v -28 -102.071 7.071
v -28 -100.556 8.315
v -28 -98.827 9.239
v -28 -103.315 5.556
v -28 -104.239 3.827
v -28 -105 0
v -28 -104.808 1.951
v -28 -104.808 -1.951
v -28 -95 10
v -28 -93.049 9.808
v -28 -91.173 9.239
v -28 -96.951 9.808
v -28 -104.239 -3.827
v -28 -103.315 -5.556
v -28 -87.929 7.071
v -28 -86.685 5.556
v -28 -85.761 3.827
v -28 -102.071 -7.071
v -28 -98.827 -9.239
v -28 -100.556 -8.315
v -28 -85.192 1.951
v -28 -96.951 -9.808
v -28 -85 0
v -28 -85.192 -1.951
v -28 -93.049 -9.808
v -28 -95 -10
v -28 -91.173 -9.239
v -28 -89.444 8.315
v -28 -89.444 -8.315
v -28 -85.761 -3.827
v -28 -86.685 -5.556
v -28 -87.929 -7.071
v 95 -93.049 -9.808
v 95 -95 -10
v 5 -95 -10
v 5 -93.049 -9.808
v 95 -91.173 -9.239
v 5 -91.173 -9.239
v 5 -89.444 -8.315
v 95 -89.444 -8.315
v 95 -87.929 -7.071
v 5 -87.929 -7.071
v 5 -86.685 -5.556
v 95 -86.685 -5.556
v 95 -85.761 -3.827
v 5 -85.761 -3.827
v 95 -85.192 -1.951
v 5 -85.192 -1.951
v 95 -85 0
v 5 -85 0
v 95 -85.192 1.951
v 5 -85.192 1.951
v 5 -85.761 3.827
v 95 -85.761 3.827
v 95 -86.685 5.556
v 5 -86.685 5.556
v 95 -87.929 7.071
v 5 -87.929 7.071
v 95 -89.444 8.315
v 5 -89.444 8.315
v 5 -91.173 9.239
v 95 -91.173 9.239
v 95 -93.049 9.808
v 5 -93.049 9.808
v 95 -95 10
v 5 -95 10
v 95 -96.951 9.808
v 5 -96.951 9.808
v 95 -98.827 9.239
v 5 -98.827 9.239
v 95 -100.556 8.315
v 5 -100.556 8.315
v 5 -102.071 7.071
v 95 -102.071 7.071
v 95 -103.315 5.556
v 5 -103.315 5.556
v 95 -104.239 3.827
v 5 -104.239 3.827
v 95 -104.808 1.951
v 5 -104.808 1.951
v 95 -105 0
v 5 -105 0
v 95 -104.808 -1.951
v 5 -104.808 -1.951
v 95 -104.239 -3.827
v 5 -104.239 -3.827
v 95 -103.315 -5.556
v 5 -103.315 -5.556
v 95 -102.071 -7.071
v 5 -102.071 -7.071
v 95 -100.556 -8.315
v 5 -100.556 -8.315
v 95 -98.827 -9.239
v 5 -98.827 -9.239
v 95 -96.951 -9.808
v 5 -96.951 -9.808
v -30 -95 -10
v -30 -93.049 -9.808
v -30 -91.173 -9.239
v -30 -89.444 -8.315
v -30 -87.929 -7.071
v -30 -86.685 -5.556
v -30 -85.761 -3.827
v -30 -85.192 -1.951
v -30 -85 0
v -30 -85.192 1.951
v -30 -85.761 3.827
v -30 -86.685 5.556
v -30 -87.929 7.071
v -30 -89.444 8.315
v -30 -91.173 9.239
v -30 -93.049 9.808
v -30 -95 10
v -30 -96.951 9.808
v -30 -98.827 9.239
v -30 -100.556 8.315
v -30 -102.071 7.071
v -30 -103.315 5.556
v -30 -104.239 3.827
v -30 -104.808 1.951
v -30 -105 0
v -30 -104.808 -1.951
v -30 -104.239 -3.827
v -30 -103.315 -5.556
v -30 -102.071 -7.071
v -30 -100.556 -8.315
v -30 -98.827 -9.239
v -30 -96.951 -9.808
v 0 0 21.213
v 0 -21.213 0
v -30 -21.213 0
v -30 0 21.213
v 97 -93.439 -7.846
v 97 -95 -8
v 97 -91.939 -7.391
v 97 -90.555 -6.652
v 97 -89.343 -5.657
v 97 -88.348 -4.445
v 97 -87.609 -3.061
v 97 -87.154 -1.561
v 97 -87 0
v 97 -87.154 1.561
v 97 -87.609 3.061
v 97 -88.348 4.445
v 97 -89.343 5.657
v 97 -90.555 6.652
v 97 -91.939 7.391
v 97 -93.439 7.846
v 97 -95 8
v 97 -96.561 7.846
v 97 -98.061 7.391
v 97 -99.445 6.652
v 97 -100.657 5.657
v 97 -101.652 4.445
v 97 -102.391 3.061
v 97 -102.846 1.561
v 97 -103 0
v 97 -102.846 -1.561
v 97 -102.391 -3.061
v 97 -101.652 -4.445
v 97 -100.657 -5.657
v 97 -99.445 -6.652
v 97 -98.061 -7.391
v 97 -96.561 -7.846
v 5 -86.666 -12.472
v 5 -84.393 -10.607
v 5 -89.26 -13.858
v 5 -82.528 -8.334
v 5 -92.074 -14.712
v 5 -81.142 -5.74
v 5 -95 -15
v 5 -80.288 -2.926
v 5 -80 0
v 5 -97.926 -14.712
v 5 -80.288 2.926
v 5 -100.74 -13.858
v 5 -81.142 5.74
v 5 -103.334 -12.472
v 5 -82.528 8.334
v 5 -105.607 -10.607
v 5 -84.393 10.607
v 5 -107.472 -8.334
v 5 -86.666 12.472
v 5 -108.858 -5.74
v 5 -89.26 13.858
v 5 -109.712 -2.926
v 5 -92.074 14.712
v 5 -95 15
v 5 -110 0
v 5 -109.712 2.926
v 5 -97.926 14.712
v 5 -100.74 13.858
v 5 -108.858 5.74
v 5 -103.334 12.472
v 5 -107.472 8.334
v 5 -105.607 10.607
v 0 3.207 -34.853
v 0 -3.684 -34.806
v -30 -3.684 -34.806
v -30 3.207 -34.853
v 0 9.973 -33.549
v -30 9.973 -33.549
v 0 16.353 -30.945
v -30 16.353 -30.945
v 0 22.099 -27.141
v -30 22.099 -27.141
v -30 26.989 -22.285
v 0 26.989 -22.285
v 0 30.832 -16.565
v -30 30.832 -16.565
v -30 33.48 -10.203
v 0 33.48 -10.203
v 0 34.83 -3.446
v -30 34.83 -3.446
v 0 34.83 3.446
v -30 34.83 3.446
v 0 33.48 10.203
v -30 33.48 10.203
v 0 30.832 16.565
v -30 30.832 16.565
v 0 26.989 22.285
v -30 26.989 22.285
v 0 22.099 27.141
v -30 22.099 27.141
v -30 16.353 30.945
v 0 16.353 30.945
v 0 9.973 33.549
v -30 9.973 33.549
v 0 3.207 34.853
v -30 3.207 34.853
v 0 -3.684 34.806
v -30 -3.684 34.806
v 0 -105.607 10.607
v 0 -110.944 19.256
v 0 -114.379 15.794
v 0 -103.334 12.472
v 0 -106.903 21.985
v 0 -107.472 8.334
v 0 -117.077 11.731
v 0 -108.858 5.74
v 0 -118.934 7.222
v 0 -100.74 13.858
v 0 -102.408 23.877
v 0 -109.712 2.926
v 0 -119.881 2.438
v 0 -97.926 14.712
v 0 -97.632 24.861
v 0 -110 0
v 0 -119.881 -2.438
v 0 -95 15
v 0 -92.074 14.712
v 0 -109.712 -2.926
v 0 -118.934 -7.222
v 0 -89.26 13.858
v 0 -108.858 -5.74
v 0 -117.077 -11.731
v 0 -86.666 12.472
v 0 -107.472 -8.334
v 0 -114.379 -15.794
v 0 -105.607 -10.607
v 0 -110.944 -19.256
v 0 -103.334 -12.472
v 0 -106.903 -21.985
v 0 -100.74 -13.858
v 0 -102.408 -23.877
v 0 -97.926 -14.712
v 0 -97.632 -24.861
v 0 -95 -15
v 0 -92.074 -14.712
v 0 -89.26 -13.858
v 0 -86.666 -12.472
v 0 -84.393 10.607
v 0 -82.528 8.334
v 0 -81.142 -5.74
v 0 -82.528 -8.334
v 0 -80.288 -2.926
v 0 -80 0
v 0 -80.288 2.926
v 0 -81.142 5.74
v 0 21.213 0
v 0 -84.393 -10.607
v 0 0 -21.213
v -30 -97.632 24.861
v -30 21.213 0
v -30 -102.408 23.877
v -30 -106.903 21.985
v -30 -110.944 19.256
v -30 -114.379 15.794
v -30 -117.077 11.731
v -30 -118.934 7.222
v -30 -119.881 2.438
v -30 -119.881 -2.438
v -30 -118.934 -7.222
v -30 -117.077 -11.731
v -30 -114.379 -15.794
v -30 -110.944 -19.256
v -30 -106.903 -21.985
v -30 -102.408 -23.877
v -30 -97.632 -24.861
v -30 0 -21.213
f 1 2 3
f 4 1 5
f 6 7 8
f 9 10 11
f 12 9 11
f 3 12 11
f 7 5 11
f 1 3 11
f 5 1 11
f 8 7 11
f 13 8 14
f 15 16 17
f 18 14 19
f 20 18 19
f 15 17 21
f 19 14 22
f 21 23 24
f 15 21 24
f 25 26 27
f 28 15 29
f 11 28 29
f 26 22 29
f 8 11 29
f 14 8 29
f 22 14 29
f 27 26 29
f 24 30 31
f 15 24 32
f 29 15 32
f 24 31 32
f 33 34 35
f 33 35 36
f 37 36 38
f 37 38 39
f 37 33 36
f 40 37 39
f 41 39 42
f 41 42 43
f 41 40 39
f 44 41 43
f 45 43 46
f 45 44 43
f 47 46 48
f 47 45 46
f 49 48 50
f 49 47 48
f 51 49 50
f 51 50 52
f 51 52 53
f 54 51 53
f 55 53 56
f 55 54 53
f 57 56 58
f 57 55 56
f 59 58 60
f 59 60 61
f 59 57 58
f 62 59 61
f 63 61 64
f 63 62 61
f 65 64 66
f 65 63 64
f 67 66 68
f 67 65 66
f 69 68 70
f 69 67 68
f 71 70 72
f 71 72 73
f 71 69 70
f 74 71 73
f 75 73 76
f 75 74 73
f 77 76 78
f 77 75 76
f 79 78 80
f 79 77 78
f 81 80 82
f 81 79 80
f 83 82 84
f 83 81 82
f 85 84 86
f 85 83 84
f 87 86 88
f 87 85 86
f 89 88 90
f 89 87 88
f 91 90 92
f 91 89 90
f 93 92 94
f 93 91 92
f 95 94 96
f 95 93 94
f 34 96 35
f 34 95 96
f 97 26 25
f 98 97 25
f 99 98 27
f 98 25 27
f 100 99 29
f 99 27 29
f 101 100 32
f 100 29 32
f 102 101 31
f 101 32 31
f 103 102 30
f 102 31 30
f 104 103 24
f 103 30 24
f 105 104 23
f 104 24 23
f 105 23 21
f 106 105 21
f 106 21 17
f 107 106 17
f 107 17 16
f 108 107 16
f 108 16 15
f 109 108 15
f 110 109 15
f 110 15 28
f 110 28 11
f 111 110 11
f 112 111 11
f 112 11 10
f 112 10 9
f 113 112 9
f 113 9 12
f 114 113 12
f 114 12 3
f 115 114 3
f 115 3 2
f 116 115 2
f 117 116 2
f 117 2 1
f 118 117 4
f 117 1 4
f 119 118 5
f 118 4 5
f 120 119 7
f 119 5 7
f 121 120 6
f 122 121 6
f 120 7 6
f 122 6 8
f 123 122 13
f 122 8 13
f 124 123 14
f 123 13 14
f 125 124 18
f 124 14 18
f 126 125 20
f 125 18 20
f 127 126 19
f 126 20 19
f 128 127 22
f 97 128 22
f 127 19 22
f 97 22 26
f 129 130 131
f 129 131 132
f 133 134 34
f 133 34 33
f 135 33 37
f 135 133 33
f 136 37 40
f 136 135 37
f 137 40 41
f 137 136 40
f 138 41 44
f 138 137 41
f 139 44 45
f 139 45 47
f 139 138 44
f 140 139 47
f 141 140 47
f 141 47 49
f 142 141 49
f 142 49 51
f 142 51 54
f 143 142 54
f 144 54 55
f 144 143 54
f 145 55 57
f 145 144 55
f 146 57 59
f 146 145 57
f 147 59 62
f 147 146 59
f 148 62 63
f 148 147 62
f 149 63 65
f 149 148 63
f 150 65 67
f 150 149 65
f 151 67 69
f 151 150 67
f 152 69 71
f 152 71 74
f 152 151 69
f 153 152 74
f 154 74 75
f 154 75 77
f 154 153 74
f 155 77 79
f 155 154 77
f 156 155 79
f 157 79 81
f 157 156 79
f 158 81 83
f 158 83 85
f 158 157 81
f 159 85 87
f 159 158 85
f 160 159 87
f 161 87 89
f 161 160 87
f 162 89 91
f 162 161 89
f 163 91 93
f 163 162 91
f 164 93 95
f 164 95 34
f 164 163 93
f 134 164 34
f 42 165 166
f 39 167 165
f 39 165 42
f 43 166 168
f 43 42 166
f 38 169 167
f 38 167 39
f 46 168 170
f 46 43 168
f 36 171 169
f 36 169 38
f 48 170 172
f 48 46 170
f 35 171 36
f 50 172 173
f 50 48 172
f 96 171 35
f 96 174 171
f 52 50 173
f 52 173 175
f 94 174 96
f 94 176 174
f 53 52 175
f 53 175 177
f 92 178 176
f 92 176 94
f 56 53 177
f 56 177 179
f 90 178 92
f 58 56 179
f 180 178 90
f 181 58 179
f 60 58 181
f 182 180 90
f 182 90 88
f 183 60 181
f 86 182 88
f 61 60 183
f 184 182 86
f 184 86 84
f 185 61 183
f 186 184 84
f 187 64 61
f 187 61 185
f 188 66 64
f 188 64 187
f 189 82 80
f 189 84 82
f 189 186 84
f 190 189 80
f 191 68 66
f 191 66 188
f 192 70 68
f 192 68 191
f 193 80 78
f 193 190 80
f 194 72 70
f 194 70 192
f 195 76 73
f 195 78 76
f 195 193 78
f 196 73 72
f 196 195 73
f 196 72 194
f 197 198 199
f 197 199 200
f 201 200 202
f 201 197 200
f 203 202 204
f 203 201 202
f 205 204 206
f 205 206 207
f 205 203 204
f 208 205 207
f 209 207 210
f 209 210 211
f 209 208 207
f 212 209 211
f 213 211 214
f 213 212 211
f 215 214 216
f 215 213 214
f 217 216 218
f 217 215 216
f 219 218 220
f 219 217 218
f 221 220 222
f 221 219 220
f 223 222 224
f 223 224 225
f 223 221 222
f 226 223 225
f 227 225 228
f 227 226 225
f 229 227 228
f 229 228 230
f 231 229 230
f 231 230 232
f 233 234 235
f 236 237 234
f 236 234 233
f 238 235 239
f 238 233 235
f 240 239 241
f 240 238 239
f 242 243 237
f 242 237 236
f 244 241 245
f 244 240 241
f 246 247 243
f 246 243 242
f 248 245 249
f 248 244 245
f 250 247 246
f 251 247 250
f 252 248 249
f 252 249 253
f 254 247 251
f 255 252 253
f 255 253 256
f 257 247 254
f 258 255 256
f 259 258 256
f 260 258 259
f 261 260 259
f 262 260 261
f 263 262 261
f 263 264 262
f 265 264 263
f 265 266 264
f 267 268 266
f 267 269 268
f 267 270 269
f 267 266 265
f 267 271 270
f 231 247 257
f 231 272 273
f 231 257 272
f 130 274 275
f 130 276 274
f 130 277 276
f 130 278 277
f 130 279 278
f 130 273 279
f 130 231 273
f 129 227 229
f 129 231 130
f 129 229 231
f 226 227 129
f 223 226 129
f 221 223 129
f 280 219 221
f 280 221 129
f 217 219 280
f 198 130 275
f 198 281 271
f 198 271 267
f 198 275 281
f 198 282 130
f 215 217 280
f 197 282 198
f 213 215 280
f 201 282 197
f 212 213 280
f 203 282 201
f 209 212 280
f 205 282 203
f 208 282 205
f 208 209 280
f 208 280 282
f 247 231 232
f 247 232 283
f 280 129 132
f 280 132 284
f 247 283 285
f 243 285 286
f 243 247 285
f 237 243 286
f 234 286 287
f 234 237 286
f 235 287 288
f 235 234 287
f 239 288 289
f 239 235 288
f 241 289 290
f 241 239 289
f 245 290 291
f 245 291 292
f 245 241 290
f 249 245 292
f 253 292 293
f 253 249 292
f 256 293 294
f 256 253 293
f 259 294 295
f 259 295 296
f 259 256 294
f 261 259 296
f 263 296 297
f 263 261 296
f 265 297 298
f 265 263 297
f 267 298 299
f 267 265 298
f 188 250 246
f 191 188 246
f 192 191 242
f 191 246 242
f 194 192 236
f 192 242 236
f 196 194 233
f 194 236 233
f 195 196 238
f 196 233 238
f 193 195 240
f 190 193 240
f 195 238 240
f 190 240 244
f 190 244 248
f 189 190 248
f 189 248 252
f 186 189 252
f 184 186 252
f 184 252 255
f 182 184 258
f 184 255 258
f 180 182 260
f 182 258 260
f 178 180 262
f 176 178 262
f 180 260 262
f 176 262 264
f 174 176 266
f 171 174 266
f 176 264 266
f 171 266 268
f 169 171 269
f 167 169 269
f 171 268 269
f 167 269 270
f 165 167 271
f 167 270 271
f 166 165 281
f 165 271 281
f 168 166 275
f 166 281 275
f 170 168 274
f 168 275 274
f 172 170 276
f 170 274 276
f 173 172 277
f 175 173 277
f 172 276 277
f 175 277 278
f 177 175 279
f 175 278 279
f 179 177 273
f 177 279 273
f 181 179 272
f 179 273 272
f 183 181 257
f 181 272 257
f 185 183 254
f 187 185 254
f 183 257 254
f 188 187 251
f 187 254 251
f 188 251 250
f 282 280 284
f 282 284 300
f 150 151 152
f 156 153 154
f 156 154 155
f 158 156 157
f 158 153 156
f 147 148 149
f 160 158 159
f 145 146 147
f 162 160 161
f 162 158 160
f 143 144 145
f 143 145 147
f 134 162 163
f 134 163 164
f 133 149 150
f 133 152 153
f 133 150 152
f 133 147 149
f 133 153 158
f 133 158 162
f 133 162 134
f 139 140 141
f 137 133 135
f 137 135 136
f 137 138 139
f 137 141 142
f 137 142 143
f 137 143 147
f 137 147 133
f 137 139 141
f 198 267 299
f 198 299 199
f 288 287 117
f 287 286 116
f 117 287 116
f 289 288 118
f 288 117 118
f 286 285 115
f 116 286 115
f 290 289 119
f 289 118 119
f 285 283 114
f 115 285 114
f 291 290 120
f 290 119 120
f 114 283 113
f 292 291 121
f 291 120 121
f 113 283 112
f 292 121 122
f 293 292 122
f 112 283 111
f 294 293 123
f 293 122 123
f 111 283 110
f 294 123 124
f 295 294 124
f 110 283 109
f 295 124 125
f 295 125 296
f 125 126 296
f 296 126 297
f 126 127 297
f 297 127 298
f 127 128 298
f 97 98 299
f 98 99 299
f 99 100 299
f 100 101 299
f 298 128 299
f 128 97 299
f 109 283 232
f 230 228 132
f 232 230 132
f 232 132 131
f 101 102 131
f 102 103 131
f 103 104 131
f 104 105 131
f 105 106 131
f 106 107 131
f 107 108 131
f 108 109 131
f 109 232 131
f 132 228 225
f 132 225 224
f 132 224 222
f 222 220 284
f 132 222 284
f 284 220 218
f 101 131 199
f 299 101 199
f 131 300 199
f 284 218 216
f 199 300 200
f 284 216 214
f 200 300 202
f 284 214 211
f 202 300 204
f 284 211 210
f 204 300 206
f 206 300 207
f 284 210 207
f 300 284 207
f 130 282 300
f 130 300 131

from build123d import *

# Parameters (mm, degrees)
SKETCH_4_R      = 10
EXTRUDE_4_DEPTH = 30
SKETCH_5_R      = 10
EXTRUDE_5_DEPTH = 28
SKETCH_6_R      = 15
EXTRUDE_6_DEPTH = 5
EXTRUDE_START   = 92
SKETCH_7_R      = 10
EXTRUDE_7_DEPTH = 92
CHAMFER_2_SIZE  = 2


with BuildPart() as part:
    # 草图4 → 凸台-拉伸4 (new body)
    with BuildSketch(Plane(origin=(0, 0, 0), x_dir=(0, 0, -1), z_dir=(1, 0, 0))):
        with BuildLine():
            Line((-34.805554051, -3.684210526), (-24.861110036, -97.631578947))
            ThreePointArc((-24.861110036, -97.631578947), (0, -120), (24.861110036, -97.631578947))
            Line((24.861110036, -97.631578947), (34.805554051, -3.684210526))
            ThreePointArc((34.805554051, -3.684210526), (0, 35), (-34.805554051, -3.684210526))
        make_face()
        with Locations((0, -95)):
            Circle(SKETCH_4_R, mode=Mode.SUBTRACT)
        Polygon((0, 21.213203436), (21.213203436, 0), (0, -21.213203436), (-21.213203436, 0), align=None, mode=Mode.SUBTRACT)
    extrude(amount=-EXTRUDE_4_DEPTH)

    # 草图5 → 凸台-拉伸5 (add)
    with BuildSketch(Plane(origin=(0, 0, 0), x_dir=(0, 0, -1), z_dir=(1, 0, 0))):
        with Locations((0, -95)):
            Circle(SKETCH_5_R)
    extrude(amount=-EXTRUDE_5_DEPTH)

    # 草图6 → 凸台-拉伸6 (add)
    with BuildSketch(Plane(origin=(0, 0, 0), x_dir=(0, 0, -1), z_dir=(1, 0, 0))):
        with Locations(Location((0, -95, 0), (0, 0, 180))):
            Circle(SKETCH_6_R)
    extrude(amount=EXTRUDE_6_DEPTH)

    # 草图7 → 凸台-拉伸7 (add)
    with BuildSketch(Plane(origin=(5, 0, 0), x_dir=(0, 0, -1), z_dir=(1, 0, 0)).offset(EXTRUDE_START)):
        with Locations((0, -95)):
            Circle(SKETCH_7_R)
    extrude(amount=-EXTRUDE_7_DEPTH)

    # 倒角2
    chamfer_2_edges = [part.edges().sort_by_distance(p)[0] for p in [
        (97, -95, 10),
    ]]
    chamfer(chamfer_2_edges, length=CHAMFER_2_SIZE)


solid = part.part
